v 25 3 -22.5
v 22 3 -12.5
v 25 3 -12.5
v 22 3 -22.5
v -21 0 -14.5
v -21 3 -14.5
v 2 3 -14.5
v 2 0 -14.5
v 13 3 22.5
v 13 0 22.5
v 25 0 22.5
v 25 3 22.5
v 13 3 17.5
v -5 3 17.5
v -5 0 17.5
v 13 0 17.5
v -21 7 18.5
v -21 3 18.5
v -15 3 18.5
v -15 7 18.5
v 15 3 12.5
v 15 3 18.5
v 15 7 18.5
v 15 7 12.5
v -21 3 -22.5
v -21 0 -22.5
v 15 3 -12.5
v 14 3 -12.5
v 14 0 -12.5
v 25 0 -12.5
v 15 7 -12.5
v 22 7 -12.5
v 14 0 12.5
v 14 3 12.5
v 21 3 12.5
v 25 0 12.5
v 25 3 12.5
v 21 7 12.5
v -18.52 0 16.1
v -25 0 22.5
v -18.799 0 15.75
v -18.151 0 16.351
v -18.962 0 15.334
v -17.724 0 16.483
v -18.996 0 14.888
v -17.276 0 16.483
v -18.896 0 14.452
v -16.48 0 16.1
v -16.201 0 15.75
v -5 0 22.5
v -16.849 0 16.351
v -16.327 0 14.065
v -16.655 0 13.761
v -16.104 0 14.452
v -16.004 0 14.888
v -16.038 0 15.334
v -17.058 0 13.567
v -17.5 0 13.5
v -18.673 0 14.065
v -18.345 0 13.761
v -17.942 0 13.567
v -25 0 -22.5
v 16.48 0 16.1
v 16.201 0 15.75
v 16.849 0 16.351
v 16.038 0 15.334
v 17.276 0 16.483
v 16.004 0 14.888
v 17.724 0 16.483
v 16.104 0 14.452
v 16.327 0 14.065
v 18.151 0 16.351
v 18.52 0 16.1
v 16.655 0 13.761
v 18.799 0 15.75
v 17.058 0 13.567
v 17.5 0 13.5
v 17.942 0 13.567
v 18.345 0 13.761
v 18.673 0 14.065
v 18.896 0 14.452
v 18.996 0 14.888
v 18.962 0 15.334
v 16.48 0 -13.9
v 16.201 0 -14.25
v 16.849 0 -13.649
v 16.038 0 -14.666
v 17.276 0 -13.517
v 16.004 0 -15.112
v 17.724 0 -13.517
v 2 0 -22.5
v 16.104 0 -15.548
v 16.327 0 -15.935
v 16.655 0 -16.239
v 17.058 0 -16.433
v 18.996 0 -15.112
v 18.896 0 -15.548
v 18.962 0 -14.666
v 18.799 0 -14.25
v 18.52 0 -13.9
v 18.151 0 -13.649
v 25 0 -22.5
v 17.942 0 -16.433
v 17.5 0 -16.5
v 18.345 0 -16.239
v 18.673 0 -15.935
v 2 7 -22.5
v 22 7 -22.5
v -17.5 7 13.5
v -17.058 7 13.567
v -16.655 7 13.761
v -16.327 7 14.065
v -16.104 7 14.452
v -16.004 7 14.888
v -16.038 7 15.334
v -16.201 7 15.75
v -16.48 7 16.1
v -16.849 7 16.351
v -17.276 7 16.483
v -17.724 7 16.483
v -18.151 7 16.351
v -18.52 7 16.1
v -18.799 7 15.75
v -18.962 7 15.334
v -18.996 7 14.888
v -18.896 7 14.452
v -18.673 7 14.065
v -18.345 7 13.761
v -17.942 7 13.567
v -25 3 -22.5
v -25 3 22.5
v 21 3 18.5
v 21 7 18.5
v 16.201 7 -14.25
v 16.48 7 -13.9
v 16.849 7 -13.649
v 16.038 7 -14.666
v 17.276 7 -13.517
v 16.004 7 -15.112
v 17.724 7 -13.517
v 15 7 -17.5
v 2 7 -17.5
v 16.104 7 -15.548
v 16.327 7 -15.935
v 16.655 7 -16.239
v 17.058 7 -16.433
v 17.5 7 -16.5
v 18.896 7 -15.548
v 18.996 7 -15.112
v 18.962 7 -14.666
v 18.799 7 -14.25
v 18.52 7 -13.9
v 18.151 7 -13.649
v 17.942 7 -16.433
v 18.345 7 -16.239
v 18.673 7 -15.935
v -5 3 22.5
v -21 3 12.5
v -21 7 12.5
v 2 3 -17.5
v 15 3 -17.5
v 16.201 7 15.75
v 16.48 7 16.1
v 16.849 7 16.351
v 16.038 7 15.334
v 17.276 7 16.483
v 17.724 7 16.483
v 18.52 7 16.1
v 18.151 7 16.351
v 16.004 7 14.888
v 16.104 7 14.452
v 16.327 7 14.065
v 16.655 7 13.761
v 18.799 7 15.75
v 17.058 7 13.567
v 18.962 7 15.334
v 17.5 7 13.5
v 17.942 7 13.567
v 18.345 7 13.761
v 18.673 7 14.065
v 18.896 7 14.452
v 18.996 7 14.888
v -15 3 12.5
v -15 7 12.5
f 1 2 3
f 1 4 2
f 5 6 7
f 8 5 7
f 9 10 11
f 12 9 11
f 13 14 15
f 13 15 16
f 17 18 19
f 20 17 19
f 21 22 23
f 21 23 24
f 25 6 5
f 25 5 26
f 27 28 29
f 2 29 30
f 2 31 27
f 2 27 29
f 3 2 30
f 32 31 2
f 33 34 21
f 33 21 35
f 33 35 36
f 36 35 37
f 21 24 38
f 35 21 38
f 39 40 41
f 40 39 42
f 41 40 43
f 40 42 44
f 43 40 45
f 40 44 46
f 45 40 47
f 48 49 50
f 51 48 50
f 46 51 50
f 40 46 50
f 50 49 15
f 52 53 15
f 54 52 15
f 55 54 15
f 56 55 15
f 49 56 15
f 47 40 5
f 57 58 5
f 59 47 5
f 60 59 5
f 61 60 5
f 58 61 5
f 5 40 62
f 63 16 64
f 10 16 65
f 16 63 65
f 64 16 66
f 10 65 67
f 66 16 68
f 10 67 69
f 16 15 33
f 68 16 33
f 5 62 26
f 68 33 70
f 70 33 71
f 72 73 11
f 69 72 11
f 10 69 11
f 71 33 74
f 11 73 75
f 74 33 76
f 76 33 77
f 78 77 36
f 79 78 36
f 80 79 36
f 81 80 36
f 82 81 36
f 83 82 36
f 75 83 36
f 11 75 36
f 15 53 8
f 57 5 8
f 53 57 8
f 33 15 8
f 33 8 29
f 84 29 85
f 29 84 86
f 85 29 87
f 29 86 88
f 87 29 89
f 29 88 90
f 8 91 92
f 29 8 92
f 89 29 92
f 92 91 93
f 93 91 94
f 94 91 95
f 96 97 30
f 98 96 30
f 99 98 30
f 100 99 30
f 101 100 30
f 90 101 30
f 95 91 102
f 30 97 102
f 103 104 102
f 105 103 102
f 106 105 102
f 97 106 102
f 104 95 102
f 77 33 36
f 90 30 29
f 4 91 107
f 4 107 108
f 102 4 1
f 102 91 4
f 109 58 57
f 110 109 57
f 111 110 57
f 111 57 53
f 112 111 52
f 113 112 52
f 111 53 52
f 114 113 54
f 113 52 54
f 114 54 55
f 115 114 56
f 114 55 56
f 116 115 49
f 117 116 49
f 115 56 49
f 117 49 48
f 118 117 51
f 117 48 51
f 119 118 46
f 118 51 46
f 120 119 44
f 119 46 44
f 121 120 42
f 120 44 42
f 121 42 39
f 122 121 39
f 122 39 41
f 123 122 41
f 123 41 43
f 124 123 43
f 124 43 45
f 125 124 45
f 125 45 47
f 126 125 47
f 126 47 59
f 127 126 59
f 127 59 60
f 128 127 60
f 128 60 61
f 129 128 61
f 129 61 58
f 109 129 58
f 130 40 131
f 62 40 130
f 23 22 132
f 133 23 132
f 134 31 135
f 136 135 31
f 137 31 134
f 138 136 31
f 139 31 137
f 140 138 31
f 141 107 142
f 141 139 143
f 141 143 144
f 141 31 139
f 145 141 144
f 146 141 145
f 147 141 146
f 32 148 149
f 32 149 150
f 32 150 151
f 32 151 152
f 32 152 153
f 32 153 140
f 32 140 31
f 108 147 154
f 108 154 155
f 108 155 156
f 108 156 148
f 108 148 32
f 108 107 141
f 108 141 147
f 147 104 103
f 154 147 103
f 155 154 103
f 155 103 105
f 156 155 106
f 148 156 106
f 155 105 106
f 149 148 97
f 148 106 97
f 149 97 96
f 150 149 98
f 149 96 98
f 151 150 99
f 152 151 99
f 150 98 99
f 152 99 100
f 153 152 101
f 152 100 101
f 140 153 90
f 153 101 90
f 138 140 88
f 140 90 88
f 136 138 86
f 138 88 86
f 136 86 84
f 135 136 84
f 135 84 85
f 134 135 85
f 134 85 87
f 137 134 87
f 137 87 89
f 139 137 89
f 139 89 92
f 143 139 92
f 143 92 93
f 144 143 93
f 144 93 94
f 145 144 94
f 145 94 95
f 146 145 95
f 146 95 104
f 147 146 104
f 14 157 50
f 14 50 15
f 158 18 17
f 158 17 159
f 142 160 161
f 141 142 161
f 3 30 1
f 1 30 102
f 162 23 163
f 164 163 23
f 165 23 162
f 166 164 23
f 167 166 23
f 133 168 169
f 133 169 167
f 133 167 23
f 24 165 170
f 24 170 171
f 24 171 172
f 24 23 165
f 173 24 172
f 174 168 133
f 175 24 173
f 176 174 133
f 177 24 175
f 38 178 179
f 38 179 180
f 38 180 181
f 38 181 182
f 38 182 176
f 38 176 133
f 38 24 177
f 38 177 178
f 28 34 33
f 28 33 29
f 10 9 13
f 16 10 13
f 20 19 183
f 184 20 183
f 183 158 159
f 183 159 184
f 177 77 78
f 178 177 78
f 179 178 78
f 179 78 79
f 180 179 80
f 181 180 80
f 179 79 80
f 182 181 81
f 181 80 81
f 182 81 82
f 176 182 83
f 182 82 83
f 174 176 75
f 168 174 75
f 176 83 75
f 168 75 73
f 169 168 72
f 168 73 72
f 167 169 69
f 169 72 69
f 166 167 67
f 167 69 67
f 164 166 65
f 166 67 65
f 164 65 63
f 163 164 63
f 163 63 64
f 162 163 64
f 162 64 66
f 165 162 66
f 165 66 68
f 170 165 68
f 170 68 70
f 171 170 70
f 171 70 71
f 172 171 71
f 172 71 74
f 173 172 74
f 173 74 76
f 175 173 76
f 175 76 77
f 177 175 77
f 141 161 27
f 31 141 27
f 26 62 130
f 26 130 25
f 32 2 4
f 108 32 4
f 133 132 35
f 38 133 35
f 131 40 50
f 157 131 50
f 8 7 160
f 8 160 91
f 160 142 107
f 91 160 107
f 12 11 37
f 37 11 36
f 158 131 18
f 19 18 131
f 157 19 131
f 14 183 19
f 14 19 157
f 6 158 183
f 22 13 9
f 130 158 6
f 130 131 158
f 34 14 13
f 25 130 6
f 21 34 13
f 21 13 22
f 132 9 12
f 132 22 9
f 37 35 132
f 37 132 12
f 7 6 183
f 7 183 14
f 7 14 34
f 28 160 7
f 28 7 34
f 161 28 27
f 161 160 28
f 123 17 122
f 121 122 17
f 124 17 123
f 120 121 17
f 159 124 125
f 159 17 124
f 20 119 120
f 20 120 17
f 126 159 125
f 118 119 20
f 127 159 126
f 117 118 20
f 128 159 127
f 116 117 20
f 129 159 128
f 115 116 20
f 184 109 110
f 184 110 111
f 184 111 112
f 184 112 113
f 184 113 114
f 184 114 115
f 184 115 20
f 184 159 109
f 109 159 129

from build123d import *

# Parameters (mm, degrees)
SKETCH_1_W          = 50
SKETCH_1_H          = 45
EXTRUDE_1_DEPTH     = 3
SKETCH_2_W          = 6
SKETCH_2_H          = 6
EXTRUDE_2_DEPTH     = 4
SKETCH_4_W          = 23
SKETCH_4_H          = 8
SKETCH_4_W_2        = 11
SKETCH_4_H_2        = 25
SKETCH_4_W_3        = 18
SKETCH_4_H_3        = 5
CUT_EXTRUDE_1_DEPTH = 4
HOLE_WIZARD_1_D     = 3


with BuildPart() as part:
    # 草图1 → 凸台-拉伸1 (new body)
    with BuildSketch(Plane(origin=(0, 0, 0), x_dir=(1, 0, 0), z_dir=(0, 1, 0))):
        Rectangle(SKETCH_1_W, SKETCH_1_H)
    extrude(amount=EXTRUDE_1_DEPTH)

    # 草图2 → 凸台-拉伸2 (add)
    with BuildSketch(Plane(origin=(0, 3, 0), x_dir=(1, 0, 0), z_dir=(0, 1, 0))):
        Polygon((22, 22.5), (15, 22.5), (2, 22.5), (2, 17.5), (15, 17.5), (15, 12.5), (22, 12.5), align=None)
        with Locations((-18, -15.5)):
            Rectangle(SKETCH_2_W, SKETCH_2_H)
        with Locations((18, -15.5)):
            Rectangle(SKETCH_2_W, SKETCH_2_H)
    extrude(amount=EXTRUDE_2_DEPTH)

    # 草图4 → 切除-拉伸1 (cut)
    with BuildSketch(Plane(origin=(0, 3, 0), x_dir=(1, 0, 0), z_dir=(0, 1, 0))):
        with Locations((-9.5, 18.5)):
            Rectangle(SKETCH_4_W, SKETCH_4_H)
        with Locations((19.5, 0)):
            Rectangle(SKETCH_4_W_2, SKETCH_4_H_2)
        with Locations((4, -20)):
            Rectangle(SKETCH_4_W_3, SKETCH_4_H_3)
    extrude(amount=-CUT_EXTRUDE_1_DEPTH, mode=Mode.SUBTRACT)

    # 孔1 (through all)
    with Locations(Plane(origin=(-17.5, 7, 15), x_dir=(0, 0, 1), z_dir=(0, 1, 0))):
        with Locations((0, 0), (0, 35), (-30, 35)):
            Hole(HOLE_WIZARD_1_D / 2)


solid = part.part
